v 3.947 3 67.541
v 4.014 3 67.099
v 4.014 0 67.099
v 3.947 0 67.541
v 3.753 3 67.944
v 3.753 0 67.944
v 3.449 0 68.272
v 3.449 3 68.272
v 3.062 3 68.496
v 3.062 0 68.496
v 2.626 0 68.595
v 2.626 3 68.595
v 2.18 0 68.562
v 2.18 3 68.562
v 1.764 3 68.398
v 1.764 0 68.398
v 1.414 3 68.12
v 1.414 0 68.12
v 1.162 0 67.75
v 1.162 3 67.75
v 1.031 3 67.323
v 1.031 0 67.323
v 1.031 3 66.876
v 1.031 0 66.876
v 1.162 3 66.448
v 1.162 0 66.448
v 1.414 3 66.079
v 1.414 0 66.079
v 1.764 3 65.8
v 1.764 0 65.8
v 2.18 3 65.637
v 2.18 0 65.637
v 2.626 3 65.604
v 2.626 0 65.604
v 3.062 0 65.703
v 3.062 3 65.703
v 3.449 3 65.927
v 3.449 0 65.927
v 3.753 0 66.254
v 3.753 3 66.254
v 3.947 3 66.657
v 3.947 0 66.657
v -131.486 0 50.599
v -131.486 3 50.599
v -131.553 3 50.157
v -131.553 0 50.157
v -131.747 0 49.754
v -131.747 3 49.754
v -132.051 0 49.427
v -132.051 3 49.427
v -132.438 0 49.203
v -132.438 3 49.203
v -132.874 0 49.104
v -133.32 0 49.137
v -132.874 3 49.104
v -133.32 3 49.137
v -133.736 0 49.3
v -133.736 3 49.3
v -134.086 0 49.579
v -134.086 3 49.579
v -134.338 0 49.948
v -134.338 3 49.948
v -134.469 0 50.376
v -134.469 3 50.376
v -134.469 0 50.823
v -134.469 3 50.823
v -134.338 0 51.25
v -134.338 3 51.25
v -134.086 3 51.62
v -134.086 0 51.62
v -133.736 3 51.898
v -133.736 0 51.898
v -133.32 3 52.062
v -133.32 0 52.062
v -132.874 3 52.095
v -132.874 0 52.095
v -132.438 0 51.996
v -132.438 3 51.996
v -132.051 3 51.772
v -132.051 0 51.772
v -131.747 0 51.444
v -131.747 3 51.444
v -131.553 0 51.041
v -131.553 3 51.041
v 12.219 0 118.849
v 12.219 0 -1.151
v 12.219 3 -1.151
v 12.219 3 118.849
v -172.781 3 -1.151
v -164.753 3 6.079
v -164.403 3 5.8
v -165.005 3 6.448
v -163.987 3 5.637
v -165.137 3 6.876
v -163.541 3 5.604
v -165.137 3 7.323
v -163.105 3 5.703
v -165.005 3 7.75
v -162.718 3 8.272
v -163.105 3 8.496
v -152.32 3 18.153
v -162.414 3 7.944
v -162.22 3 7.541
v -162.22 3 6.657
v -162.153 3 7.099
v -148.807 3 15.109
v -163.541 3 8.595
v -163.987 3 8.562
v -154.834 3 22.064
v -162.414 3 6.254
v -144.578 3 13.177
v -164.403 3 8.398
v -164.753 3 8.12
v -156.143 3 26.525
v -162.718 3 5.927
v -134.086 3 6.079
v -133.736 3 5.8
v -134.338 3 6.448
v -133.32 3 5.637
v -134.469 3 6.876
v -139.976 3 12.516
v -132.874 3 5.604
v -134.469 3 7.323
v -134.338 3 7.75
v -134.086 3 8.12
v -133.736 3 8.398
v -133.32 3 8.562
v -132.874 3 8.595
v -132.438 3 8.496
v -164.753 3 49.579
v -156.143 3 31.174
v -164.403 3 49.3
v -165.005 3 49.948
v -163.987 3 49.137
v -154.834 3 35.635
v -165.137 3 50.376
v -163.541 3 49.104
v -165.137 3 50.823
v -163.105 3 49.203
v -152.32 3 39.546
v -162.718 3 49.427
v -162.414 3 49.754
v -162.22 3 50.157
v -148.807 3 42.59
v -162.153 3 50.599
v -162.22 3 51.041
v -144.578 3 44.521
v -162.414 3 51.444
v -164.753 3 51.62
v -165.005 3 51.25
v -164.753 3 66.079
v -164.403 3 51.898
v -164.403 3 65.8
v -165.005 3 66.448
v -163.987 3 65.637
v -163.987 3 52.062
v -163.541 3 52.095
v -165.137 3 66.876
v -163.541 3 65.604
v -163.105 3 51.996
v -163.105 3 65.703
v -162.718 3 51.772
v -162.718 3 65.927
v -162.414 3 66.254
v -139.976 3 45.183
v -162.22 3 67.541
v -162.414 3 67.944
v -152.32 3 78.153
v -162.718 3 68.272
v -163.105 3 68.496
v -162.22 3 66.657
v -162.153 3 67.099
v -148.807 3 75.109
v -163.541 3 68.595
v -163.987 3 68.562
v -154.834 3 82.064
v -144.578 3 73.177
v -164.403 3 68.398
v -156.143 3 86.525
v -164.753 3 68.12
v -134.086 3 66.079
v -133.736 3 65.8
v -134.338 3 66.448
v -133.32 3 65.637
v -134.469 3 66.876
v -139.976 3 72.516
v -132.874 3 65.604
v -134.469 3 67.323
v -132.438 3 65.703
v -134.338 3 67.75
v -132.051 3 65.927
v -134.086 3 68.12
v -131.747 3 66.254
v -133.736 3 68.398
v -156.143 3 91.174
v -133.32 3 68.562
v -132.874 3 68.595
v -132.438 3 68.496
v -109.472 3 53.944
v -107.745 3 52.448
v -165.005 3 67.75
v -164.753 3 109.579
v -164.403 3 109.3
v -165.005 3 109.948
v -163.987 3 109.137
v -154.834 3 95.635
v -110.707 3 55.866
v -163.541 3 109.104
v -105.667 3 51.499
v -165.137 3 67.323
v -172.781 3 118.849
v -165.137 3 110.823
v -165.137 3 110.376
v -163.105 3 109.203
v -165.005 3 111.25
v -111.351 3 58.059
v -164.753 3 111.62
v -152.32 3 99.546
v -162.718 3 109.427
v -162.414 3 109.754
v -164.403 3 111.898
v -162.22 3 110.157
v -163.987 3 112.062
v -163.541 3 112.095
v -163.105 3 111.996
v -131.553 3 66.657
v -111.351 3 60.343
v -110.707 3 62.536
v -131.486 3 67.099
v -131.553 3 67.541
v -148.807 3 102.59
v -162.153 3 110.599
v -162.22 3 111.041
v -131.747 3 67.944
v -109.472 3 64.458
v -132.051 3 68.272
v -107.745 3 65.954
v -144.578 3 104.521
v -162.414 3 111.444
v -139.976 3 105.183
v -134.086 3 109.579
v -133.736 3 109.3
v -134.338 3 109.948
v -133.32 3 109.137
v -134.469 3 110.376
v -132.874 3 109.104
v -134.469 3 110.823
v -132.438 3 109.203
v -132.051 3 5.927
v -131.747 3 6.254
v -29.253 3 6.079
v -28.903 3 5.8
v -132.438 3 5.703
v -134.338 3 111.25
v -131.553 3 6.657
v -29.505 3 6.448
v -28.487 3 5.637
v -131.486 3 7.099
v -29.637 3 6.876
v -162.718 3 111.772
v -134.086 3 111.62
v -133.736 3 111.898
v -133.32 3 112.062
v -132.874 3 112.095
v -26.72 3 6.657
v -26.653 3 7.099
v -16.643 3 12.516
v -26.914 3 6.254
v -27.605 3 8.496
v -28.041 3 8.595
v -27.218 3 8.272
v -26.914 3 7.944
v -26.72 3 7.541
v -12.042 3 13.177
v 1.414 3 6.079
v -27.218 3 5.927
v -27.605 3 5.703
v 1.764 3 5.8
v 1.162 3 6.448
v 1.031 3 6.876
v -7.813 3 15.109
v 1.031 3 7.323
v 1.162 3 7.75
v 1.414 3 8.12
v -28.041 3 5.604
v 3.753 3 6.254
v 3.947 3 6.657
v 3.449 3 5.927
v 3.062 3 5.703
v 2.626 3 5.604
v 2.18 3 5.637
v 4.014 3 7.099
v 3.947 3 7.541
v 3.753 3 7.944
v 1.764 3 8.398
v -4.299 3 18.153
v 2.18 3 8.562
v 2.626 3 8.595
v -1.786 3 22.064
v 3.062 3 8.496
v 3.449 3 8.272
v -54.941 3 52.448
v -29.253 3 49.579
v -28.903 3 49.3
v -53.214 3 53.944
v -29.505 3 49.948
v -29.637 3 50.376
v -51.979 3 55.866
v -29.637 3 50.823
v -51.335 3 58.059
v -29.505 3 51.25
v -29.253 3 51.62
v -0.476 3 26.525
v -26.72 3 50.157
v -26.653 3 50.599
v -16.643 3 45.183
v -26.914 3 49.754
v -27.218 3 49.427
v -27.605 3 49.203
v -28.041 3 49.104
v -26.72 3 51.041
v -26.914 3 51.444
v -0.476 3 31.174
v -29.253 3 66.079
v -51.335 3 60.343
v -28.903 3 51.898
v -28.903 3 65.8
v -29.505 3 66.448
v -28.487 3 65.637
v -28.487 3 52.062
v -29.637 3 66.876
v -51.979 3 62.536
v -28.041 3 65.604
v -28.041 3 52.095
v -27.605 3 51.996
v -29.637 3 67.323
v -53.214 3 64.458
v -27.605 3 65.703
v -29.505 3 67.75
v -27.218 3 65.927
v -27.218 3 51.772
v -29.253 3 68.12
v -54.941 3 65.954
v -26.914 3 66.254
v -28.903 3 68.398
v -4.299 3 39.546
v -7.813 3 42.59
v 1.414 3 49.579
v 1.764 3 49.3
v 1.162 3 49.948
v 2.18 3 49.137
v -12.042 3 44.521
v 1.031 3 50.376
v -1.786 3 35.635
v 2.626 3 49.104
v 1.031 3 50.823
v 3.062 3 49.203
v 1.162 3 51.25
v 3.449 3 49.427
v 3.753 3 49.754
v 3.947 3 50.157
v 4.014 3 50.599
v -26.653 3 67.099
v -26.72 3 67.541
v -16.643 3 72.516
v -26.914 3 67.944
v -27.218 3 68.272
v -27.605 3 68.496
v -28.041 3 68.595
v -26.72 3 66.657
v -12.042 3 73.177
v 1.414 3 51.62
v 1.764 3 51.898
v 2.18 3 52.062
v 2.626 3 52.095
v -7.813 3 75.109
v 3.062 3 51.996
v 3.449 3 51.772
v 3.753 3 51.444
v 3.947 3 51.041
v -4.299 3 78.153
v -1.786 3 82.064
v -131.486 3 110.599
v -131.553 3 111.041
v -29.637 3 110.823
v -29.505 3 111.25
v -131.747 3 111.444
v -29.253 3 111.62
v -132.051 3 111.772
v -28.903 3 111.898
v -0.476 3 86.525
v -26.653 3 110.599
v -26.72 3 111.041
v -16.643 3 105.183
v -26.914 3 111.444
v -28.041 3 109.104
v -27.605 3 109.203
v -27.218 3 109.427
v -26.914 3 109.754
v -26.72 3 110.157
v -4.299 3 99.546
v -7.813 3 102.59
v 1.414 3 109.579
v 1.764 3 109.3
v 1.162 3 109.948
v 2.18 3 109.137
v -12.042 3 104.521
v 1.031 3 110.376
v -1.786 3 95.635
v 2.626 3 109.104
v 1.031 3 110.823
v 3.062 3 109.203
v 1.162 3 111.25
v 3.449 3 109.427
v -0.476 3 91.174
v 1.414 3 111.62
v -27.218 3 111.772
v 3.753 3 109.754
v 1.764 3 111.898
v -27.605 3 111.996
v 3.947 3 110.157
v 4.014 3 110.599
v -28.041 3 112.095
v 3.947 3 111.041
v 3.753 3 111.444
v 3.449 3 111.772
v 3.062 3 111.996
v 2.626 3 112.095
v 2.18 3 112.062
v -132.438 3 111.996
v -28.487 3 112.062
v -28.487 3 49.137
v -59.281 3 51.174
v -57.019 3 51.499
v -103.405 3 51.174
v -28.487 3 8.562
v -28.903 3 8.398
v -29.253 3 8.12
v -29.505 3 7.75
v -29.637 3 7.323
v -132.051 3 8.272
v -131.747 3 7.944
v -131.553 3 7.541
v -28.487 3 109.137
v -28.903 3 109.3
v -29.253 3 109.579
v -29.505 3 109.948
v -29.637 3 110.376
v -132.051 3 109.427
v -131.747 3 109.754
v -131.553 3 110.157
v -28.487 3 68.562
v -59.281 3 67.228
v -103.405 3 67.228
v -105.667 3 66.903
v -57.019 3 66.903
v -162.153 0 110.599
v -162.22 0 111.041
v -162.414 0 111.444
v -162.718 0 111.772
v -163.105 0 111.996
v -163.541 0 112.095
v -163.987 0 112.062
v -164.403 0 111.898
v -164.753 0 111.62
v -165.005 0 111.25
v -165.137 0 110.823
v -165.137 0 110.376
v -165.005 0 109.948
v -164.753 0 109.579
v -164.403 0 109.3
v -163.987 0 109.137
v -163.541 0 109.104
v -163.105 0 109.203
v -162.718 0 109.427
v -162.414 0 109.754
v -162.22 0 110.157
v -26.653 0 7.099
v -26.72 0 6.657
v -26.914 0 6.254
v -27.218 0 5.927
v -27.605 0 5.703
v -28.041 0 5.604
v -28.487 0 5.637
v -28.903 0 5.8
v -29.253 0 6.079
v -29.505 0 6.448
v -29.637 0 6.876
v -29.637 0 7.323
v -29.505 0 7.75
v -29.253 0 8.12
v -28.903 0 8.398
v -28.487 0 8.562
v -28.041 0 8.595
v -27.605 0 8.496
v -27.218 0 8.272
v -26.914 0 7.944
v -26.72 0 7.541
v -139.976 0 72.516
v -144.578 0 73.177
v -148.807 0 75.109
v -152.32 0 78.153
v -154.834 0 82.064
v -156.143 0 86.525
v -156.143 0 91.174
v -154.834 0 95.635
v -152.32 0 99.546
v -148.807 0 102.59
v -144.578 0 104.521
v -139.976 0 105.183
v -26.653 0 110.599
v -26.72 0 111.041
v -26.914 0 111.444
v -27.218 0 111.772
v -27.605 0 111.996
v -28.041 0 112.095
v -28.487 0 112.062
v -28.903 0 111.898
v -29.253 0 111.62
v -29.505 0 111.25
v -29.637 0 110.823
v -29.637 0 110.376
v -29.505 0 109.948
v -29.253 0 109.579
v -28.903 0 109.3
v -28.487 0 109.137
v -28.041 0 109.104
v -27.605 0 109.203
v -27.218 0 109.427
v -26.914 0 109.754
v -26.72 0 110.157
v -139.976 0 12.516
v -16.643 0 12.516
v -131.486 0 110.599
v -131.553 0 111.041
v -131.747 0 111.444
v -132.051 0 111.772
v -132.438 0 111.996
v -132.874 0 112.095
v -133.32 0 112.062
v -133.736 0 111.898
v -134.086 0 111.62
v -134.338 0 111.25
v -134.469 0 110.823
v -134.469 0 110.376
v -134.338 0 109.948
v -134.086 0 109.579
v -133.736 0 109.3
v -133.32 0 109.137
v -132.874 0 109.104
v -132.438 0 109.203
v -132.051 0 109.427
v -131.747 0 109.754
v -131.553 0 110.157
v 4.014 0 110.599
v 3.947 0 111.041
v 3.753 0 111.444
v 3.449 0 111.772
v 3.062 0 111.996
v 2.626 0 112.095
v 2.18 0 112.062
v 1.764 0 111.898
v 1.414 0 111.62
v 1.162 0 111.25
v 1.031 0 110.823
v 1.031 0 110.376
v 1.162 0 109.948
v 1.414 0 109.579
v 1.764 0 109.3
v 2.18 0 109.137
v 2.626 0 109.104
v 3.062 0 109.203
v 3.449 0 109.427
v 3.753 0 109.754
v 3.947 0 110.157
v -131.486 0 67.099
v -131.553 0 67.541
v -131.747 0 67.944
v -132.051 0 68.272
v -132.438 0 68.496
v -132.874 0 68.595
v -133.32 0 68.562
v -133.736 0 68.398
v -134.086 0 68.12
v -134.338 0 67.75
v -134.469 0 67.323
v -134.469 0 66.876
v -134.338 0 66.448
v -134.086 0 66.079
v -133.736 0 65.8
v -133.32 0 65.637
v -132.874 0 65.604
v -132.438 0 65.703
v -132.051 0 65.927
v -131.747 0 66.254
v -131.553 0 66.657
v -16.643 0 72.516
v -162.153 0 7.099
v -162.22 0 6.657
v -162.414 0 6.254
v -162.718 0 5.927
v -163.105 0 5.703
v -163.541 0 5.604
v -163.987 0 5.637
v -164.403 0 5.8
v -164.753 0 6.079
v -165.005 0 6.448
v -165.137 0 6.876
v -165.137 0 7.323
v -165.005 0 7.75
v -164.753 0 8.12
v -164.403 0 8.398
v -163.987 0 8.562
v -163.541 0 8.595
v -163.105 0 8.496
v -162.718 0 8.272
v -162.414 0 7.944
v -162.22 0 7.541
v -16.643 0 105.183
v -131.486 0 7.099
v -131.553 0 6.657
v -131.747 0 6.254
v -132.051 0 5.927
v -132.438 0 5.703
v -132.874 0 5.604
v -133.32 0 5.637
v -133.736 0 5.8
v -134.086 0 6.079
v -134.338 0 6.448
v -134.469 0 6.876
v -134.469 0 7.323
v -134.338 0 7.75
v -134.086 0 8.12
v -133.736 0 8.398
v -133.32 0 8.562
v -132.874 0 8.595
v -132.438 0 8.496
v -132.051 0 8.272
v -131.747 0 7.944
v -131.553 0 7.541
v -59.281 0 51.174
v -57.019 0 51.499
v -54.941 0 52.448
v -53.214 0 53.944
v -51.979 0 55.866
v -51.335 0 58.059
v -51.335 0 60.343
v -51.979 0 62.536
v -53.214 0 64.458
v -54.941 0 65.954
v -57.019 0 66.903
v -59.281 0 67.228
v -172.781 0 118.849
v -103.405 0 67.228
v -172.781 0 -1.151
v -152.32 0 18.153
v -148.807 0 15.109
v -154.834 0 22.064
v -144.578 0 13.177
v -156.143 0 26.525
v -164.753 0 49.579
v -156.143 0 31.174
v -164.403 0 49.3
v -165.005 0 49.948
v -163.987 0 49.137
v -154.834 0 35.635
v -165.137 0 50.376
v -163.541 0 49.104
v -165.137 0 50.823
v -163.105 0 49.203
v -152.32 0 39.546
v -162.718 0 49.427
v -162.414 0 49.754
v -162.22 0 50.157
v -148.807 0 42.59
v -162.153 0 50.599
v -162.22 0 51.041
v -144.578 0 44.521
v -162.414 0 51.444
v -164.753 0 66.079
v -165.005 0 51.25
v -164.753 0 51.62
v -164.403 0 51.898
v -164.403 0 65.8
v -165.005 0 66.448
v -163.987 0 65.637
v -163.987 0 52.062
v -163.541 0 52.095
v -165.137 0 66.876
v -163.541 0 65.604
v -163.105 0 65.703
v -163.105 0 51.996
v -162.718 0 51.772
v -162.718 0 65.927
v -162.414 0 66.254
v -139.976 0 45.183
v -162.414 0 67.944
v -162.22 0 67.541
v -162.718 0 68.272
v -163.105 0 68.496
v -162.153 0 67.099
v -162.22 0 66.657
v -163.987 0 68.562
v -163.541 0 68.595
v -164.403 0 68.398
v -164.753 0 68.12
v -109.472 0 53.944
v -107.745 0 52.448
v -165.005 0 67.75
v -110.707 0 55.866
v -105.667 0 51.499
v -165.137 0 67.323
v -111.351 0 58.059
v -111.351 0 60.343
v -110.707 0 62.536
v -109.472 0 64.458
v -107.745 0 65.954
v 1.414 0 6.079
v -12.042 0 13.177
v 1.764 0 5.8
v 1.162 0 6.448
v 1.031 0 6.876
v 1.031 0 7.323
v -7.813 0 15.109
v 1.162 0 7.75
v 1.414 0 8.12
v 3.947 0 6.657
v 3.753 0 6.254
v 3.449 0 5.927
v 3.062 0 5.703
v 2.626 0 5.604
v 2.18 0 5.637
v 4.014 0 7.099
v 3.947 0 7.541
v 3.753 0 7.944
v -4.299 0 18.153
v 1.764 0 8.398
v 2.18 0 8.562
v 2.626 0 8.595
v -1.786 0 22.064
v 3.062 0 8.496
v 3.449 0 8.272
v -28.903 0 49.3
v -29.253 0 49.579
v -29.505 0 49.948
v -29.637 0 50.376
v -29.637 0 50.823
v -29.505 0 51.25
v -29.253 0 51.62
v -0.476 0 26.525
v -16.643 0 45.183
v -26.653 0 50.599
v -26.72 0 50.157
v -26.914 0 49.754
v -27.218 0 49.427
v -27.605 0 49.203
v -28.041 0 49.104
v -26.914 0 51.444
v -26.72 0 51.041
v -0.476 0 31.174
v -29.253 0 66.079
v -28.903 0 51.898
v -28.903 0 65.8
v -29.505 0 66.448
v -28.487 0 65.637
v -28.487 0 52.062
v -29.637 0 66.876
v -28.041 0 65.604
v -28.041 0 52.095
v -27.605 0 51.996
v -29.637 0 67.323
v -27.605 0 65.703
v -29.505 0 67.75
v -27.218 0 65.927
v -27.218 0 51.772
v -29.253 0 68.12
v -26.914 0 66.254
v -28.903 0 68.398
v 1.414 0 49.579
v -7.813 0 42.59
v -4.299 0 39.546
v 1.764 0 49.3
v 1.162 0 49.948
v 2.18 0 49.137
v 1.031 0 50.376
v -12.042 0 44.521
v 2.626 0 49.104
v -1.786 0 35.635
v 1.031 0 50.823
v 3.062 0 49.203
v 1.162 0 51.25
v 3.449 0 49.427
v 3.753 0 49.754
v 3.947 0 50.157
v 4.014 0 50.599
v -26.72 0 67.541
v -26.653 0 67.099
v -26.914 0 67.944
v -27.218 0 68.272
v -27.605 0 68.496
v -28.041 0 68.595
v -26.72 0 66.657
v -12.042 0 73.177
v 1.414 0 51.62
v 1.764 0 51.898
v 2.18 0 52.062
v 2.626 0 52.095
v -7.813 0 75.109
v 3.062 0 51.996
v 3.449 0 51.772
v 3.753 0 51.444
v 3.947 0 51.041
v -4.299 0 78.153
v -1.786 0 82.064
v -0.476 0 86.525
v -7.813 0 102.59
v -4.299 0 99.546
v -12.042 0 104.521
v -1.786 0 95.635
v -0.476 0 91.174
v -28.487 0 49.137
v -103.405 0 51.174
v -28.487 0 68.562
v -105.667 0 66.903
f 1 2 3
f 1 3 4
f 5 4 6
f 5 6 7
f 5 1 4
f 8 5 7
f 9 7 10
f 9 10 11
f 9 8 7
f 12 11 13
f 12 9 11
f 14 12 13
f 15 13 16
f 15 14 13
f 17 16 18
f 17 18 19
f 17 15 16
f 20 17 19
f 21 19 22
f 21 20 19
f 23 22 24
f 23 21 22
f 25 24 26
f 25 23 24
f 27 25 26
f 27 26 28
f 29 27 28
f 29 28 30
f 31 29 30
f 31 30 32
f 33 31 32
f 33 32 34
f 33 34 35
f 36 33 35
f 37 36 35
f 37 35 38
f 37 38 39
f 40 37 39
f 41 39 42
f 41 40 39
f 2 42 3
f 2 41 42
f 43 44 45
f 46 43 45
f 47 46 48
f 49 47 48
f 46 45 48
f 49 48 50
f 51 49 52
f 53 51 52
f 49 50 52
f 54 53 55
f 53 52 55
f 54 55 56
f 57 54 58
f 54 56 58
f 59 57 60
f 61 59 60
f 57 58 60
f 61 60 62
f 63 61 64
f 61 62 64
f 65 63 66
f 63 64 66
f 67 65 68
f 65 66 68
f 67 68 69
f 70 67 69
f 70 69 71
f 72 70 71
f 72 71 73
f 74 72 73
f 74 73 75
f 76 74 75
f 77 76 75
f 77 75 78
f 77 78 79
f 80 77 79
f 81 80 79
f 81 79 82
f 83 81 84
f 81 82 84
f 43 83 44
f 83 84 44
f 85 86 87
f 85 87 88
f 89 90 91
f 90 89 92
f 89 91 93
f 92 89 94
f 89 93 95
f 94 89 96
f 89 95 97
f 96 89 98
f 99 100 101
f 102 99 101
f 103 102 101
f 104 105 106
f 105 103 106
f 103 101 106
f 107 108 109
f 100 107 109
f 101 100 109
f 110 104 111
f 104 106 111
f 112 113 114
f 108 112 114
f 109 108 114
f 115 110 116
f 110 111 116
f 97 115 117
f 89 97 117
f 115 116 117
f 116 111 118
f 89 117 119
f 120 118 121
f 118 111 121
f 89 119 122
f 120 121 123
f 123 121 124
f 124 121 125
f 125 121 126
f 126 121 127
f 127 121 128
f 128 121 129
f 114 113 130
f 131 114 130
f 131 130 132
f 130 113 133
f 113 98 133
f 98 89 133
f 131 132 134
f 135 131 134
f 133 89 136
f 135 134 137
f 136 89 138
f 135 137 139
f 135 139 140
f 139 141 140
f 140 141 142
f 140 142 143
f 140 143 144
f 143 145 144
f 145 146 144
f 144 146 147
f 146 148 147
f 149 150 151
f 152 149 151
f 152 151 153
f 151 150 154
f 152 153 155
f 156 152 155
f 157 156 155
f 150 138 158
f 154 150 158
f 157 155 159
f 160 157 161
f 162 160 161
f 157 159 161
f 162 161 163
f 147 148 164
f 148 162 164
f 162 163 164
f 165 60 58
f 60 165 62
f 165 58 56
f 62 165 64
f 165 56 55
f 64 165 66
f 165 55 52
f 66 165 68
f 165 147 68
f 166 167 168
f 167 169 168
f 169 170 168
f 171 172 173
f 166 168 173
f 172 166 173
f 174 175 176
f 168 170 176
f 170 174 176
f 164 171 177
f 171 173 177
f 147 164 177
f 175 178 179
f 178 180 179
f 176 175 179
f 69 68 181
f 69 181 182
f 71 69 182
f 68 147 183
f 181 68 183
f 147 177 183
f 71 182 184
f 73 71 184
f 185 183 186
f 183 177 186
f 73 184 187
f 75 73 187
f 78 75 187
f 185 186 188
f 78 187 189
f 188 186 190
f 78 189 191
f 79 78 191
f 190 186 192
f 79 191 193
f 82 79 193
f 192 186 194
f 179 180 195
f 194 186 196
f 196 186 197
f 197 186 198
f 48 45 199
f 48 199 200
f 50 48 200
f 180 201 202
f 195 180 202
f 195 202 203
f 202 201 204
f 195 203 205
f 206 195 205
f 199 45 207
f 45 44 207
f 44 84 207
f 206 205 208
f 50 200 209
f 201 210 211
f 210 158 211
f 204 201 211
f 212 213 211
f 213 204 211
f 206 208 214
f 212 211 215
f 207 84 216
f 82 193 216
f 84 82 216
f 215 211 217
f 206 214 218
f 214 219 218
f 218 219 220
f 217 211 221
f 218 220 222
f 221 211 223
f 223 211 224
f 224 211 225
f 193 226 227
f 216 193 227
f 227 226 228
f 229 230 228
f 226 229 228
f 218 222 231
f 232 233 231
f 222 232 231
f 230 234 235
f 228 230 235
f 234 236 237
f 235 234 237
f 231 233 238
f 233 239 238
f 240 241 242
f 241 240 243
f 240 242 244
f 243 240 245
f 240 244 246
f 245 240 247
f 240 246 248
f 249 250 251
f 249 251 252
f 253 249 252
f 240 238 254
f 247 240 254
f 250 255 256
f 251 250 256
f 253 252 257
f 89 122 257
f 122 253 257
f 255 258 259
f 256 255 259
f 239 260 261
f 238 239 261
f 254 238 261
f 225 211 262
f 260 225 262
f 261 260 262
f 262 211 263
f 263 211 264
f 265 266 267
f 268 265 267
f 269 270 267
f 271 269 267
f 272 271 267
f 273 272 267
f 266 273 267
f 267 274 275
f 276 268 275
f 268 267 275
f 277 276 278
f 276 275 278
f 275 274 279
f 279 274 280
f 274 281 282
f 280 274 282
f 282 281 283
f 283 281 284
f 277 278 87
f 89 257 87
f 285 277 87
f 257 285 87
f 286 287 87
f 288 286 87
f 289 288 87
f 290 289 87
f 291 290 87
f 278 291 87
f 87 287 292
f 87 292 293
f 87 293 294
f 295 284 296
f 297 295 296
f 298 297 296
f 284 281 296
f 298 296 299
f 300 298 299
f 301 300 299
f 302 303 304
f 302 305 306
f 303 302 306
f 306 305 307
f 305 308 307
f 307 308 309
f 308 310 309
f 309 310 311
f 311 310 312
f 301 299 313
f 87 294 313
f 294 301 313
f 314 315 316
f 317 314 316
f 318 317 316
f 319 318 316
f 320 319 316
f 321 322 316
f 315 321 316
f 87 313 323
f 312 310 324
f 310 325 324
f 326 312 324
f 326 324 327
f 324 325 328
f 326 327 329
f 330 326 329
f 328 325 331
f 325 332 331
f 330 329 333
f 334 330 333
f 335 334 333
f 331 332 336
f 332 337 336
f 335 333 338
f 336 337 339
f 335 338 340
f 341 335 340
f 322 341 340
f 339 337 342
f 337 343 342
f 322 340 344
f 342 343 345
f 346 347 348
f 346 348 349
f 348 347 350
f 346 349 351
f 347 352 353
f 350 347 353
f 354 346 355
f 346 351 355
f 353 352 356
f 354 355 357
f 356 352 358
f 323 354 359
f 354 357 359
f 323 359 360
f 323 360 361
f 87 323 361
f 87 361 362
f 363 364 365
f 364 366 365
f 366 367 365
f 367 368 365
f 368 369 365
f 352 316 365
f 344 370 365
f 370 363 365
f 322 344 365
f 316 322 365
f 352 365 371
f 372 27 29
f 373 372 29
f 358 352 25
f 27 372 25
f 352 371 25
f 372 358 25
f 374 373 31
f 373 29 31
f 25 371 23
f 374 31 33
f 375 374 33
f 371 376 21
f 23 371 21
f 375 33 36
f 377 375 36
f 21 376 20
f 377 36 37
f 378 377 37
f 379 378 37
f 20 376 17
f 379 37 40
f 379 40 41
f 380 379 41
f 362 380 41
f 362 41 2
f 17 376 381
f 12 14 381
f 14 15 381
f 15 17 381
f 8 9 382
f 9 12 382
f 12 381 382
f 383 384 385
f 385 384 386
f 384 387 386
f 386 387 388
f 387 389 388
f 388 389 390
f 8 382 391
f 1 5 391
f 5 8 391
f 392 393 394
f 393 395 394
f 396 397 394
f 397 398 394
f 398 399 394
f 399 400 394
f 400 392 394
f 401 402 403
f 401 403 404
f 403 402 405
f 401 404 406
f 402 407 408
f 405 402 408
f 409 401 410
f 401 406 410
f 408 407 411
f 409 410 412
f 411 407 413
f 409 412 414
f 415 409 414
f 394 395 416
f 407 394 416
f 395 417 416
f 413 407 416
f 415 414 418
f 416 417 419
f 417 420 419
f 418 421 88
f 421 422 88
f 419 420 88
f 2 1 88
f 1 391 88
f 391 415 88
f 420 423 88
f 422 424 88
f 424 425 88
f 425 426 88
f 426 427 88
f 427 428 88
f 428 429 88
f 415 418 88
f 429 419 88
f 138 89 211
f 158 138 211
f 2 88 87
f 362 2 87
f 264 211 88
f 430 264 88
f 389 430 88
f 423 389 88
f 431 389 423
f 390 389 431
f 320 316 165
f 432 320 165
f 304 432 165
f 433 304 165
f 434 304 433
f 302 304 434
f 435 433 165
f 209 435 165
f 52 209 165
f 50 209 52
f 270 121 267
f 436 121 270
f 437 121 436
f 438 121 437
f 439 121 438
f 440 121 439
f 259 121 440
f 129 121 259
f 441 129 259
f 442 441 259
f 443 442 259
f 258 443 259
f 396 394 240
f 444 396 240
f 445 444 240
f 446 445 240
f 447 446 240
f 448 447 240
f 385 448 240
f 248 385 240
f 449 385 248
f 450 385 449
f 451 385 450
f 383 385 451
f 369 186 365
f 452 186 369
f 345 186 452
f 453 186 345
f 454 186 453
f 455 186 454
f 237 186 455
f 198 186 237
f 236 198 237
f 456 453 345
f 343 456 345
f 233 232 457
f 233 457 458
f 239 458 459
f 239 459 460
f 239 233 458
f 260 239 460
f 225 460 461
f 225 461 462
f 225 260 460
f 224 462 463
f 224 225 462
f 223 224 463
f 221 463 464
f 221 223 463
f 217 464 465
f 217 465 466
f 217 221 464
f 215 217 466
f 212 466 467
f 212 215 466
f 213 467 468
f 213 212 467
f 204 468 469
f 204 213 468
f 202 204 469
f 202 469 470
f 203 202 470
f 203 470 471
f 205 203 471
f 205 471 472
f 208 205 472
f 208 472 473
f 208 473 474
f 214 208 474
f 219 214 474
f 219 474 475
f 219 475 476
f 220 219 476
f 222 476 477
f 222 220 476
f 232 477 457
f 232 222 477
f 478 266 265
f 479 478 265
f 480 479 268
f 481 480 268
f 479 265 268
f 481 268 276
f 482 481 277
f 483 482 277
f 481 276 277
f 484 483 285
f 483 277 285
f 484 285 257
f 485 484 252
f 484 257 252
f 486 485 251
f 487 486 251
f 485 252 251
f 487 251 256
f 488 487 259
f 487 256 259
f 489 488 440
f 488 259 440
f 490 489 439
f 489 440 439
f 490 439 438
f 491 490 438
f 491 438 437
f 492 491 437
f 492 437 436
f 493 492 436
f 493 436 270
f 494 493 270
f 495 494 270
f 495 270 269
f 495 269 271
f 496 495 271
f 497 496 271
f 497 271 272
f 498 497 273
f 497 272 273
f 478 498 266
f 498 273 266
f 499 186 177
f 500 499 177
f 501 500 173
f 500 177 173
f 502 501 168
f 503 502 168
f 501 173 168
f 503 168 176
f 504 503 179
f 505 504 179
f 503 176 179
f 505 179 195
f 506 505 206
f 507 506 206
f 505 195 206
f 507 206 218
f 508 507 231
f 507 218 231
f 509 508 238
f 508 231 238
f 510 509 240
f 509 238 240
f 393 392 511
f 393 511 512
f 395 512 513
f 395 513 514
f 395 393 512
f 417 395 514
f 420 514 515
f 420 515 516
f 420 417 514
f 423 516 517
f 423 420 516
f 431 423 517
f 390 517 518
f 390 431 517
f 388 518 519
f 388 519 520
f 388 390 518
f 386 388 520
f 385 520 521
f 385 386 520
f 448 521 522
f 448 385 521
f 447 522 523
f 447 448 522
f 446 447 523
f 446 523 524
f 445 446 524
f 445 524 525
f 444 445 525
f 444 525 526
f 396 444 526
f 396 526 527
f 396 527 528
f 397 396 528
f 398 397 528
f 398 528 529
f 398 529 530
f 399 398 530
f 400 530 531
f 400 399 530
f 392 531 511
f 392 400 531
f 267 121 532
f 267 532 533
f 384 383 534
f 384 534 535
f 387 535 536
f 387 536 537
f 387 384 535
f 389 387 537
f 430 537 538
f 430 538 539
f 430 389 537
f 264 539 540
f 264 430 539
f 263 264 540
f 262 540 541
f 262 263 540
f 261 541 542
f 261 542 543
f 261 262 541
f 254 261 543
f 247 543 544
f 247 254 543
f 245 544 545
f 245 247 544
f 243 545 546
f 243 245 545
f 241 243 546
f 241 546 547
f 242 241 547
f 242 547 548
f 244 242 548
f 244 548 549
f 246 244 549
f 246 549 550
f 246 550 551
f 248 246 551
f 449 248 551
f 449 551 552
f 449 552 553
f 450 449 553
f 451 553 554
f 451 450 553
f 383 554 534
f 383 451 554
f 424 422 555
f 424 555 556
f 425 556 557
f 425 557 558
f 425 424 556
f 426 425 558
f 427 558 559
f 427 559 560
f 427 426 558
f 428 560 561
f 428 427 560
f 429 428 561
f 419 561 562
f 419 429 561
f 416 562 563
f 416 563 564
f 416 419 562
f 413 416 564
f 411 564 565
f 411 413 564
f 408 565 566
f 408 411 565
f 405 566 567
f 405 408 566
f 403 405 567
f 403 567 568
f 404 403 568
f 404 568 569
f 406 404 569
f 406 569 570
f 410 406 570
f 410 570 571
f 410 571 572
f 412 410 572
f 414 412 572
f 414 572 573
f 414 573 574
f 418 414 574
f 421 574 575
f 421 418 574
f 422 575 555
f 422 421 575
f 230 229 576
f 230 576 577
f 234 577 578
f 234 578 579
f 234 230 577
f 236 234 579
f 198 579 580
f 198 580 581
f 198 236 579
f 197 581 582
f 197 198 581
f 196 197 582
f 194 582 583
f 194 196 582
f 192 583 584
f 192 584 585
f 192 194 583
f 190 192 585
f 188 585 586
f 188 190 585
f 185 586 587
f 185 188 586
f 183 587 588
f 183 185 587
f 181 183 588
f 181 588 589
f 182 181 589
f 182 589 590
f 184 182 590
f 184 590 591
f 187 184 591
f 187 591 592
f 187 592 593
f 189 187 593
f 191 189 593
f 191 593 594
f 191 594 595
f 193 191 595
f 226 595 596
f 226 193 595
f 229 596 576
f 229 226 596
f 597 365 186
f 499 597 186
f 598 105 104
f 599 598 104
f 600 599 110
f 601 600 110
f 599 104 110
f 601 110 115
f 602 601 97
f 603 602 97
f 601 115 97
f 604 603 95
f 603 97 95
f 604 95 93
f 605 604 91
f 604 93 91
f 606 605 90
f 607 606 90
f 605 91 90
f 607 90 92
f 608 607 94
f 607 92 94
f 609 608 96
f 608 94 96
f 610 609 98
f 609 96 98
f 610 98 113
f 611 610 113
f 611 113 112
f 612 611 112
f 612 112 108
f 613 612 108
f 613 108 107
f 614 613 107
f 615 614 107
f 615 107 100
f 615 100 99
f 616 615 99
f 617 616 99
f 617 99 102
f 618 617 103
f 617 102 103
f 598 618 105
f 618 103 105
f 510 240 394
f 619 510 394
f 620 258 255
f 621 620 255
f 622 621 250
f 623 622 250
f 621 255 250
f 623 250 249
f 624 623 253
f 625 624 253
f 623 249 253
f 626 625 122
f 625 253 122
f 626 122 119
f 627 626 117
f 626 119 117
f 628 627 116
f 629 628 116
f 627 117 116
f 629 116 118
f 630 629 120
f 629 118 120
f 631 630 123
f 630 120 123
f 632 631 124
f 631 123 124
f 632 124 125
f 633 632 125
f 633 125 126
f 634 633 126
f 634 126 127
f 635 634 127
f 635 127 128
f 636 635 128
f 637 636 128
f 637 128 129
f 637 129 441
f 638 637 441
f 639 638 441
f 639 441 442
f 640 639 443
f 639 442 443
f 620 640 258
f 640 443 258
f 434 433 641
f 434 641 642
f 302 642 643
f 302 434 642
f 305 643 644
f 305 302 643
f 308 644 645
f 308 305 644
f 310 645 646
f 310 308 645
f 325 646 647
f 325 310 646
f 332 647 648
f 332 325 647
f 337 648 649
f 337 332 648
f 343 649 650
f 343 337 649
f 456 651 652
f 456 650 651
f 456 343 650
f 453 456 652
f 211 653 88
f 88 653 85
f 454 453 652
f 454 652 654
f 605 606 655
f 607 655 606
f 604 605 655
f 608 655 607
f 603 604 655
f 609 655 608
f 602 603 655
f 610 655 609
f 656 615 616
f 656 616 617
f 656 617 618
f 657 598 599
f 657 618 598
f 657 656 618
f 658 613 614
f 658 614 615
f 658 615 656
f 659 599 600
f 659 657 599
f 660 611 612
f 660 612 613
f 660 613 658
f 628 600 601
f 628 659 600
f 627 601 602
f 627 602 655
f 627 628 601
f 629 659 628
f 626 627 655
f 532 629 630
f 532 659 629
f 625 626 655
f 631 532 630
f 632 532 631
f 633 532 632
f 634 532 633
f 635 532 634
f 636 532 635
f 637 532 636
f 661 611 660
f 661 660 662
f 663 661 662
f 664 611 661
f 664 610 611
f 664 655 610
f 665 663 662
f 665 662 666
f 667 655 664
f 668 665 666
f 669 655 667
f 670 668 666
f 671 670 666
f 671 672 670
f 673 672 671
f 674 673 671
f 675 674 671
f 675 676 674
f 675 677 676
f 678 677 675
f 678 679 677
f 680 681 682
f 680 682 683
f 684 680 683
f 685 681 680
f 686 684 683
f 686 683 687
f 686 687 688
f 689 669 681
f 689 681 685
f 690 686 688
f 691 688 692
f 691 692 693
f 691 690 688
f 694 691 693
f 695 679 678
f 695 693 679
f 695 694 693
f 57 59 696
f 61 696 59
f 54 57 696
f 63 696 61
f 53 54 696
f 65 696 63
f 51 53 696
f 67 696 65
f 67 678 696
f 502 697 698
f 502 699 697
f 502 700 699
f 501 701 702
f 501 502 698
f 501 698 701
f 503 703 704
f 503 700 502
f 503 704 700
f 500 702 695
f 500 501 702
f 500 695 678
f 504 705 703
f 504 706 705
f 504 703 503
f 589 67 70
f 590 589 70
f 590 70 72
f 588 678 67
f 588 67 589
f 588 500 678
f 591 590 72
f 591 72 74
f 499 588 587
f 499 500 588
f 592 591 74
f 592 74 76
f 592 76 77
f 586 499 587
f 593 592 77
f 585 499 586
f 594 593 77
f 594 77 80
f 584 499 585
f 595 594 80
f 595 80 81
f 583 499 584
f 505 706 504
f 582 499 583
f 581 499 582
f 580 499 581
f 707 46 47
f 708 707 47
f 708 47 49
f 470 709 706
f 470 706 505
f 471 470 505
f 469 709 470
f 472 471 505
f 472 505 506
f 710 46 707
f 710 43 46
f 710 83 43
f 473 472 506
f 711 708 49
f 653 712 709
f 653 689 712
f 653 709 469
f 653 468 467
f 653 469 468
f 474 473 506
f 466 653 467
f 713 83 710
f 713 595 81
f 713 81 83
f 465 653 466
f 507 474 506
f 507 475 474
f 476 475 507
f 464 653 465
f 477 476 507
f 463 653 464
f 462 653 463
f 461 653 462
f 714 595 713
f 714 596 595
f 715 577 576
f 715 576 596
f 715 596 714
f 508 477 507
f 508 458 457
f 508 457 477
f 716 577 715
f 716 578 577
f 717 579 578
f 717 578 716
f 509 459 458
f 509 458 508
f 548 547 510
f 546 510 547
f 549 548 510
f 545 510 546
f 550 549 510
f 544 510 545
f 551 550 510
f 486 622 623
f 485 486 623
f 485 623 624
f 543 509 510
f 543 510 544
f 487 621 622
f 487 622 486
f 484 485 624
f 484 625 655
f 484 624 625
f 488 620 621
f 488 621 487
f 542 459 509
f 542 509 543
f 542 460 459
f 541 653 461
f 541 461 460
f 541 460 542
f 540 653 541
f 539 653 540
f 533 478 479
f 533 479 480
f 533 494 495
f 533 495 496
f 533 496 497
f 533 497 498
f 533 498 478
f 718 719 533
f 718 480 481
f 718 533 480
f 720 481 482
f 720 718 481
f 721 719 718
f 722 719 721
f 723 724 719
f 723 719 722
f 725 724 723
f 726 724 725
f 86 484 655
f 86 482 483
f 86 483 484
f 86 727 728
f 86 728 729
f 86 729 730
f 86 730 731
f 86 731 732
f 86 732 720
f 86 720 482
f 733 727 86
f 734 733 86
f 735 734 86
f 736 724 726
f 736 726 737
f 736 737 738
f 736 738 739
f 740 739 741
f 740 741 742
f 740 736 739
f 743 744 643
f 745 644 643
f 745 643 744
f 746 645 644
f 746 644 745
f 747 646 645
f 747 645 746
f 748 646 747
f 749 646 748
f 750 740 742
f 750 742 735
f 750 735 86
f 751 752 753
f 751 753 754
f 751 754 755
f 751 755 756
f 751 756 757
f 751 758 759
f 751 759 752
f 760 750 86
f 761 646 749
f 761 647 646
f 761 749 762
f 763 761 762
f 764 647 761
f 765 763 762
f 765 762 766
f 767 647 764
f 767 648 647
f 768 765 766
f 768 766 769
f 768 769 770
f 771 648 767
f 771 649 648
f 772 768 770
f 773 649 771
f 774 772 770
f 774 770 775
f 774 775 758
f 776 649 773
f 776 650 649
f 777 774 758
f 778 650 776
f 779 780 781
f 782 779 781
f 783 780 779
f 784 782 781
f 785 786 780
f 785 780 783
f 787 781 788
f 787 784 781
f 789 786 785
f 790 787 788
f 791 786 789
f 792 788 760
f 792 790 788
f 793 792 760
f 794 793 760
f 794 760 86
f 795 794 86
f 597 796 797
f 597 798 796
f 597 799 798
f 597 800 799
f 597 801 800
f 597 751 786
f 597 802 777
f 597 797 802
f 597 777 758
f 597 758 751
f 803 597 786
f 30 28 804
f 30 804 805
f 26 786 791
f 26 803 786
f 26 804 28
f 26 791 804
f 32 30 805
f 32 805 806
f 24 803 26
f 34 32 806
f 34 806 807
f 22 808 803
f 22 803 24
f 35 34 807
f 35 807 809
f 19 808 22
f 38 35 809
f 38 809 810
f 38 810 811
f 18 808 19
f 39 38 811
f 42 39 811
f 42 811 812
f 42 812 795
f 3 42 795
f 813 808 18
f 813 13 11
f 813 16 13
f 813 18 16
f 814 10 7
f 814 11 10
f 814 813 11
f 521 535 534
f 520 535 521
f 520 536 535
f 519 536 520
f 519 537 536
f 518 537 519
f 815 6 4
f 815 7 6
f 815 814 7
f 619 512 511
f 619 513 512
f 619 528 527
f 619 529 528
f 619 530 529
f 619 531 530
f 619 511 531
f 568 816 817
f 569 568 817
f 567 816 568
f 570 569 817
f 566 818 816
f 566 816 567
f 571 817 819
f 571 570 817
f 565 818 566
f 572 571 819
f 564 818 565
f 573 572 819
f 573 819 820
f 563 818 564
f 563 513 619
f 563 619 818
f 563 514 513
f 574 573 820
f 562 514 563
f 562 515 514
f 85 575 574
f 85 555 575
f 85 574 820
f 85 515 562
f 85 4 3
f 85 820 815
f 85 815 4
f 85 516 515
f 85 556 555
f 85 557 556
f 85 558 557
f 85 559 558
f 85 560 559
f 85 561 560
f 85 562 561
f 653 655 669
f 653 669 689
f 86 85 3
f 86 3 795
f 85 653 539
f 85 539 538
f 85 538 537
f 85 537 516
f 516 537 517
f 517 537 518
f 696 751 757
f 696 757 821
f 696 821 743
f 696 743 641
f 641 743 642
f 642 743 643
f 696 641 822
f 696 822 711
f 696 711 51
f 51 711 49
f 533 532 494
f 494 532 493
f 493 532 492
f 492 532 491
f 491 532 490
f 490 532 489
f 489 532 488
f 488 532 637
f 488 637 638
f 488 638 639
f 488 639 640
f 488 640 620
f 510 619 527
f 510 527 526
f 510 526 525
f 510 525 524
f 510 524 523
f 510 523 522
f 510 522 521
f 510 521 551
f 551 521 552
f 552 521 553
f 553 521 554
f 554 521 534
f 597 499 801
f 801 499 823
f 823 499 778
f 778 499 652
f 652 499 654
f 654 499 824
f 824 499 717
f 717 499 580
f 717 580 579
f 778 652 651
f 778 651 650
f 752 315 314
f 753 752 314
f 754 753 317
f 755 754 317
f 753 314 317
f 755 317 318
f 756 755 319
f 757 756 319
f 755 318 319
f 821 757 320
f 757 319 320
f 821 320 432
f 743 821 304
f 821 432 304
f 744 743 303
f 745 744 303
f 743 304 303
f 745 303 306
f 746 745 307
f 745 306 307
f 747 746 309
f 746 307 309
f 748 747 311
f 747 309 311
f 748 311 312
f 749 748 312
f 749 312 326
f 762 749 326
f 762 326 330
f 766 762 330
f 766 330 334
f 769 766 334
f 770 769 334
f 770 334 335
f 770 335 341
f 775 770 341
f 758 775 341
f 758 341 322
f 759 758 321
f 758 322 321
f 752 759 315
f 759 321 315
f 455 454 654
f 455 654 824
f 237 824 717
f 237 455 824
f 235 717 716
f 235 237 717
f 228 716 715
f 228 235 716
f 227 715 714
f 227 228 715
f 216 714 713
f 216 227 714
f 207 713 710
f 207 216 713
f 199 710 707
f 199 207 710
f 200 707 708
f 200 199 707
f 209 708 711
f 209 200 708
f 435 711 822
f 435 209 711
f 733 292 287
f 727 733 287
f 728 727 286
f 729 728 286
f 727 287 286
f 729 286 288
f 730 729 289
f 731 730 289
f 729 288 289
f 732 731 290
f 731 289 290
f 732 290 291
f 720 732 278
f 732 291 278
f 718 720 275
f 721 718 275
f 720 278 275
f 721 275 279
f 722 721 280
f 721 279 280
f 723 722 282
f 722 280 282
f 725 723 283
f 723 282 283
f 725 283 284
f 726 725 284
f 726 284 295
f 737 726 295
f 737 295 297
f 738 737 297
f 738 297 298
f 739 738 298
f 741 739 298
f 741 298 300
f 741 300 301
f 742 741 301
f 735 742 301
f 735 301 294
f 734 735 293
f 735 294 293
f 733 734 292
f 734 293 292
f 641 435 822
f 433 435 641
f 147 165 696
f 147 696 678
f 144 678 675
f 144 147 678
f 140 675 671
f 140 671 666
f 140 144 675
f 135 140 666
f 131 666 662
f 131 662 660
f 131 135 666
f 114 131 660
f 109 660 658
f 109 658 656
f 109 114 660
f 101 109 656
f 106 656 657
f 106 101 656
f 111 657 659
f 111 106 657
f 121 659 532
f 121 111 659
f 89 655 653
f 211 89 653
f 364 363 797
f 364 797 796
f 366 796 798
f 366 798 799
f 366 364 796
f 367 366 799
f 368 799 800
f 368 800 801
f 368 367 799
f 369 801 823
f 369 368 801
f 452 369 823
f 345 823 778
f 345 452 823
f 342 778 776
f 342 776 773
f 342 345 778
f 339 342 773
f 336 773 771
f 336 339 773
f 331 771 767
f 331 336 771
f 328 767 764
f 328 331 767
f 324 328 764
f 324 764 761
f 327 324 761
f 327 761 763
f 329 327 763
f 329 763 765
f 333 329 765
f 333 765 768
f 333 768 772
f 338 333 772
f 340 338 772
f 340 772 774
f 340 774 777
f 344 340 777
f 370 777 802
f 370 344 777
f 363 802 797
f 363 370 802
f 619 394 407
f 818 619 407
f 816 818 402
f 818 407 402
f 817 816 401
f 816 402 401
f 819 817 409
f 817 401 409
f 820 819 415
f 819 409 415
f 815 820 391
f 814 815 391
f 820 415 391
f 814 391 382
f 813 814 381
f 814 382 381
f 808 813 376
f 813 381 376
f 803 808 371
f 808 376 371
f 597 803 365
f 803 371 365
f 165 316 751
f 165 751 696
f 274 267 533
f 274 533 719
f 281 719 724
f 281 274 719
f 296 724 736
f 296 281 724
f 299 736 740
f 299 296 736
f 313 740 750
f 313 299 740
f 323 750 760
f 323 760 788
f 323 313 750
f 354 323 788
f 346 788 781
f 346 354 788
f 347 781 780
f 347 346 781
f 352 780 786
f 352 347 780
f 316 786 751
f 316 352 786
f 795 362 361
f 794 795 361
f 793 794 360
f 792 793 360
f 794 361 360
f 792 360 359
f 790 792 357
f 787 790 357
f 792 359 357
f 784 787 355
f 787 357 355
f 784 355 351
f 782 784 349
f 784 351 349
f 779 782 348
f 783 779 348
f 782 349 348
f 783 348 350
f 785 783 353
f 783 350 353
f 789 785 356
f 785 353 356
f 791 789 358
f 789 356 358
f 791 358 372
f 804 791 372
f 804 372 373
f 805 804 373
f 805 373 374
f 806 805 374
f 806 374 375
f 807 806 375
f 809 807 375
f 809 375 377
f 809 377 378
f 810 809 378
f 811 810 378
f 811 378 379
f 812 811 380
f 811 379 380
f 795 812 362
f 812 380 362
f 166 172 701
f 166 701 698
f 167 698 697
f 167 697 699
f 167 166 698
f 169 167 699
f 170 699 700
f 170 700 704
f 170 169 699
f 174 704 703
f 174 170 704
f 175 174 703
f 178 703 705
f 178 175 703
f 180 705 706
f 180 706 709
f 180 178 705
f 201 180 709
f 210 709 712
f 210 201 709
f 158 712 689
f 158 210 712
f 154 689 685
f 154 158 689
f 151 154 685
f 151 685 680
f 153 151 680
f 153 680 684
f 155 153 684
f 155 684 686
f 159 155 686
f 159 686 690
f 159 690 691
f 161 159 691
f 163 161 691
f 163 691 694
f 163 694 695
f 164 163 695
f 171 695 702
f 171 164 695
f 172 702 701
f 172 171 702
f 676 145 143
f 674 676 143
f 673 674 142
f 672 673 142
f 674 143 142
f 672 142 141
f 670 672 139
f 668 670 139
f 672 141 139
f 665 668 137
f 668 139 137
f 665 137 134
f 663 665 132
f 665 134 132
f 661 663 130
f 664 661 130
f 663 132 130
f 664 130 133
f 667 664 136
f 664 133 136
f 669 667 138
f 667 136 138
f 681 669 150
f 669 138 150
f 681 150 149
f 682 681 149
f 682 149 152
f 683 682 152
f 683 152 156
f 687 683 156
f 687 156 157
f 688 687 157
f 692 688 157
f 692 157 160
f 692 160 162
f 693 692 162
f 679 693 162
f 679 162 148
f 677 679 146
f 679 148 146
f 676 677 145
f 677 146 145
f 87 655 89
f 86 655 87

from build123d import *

# Parameters (mm, degrees)
SKETCH1_W           = 185
SKETCH1_H           = 60
BOSS_EXTRUDE1_DEPTH = 3
SKETCH2_R           = 1.5
CUT_EXTRUDE1_DEPTH  = 3
CUT_EXTRUDE2_DEPTH  = 10


with BuildPart() as part:
    # Sketch1 → Boss-Extrude1 (new body)
    with BuildSketch(Plane(origin=(0, 0, 0), x_dir=(1, 0, 0), z_dir=(0, 1, 0))):
        with Locations((-80.280821918, -28.849315068)):
            Rectangle(SKETCH1_W, SKETCH1_H)
    extrude(amount=BOSS_EXTRUDE1_DEPTH)

    # Sketch2 → Cut-Extrude1 (cut)
    with BuildSketch(Plane(origin=(0, 3, 0), x_dir=(1, 0, 0), z_dir=(0, 1, 0))):
        with Locations((-163.653280502, -7.099315068)):
            Circle(SKETCH2_R)
        with Locations((-163.653280502, -50.599315068)):
            Circle(SKETCH2_R)
        with Locations((-28.153280502, -50.599315068)):
            Circle(SKETCH2_R)
        with Locations((-28.153280502, -7.099315068)):
            Circle(SKETCH2_R)
        with Locations((-132.986057559, -7.099315068)):
            Circle(SKETCH2_R)
        with Locations((-132.986057559, -50.599315068)):
            Circle(SKETCH2_R)
        with Locations((2.513942441, -50.599315068)):
            Circle(SKETCH2_R)
        with Locations((2.513942441, -7.099315068)):
            Circle(SKETCH2_R)
        with BuildLine():
            Line((-139.976197673, -12.515770436), (-16.64325173, -12.515770436))
            ThreePointArc((-16.64325173, -12.515770436), (-0.309707097, -28.849315068), (-16.64325173, -45.182859701))
            Line((-16.64325173, -45.182859701), (-139.976197673, -45.182859701))
            ThreePointArc((-139.976197673, -45.182859701), (-156.309742305, -28.849315068), (-139.976197673, -12.515770436))
        make_face()
    extrude(amount=-CUT_EXTRUDE1_DEPTH, mode=Mode.SUBTRACT)

    # Mirror1: part across plane


with BuildPart() as part_1:
    add(part.part)
    add(part.part.mirror(Plane(origin=(-172.780821918, 3, 58.849315068), x_dir=(1, 0, 0), z_dir=(0, 0, -1))))

    # Sketch3 → Cut-Extrude2 (cut)
    with BuildSketch(Plane(origin=(0, 3, 0), x_dir=(1, 0, 0), z_dir=(0, 1, 0))):
        with BuildLine():
            Line((-103.404990518, -51.173645659), (-59.281035157, -51.173645659))
            ThreePointArc((-59.281035157, -51.173645659), (-51.253781089, -59.200899728), (-59.281035157, -67.228153796))
            Line((-59.281035157, -67.228153796), (-103.404990518, -67.228153796))
            ThreePointArc((-103.404990518, -67.228153796), (-111.432244586, -59.200899728), (-103.404990518, -51.173645659))
        make_face()
    extrude(amount=-CUT_EXTRUDE2_DEPTH, mode=Mode.SUBTRACT)


solid = part_1.part
